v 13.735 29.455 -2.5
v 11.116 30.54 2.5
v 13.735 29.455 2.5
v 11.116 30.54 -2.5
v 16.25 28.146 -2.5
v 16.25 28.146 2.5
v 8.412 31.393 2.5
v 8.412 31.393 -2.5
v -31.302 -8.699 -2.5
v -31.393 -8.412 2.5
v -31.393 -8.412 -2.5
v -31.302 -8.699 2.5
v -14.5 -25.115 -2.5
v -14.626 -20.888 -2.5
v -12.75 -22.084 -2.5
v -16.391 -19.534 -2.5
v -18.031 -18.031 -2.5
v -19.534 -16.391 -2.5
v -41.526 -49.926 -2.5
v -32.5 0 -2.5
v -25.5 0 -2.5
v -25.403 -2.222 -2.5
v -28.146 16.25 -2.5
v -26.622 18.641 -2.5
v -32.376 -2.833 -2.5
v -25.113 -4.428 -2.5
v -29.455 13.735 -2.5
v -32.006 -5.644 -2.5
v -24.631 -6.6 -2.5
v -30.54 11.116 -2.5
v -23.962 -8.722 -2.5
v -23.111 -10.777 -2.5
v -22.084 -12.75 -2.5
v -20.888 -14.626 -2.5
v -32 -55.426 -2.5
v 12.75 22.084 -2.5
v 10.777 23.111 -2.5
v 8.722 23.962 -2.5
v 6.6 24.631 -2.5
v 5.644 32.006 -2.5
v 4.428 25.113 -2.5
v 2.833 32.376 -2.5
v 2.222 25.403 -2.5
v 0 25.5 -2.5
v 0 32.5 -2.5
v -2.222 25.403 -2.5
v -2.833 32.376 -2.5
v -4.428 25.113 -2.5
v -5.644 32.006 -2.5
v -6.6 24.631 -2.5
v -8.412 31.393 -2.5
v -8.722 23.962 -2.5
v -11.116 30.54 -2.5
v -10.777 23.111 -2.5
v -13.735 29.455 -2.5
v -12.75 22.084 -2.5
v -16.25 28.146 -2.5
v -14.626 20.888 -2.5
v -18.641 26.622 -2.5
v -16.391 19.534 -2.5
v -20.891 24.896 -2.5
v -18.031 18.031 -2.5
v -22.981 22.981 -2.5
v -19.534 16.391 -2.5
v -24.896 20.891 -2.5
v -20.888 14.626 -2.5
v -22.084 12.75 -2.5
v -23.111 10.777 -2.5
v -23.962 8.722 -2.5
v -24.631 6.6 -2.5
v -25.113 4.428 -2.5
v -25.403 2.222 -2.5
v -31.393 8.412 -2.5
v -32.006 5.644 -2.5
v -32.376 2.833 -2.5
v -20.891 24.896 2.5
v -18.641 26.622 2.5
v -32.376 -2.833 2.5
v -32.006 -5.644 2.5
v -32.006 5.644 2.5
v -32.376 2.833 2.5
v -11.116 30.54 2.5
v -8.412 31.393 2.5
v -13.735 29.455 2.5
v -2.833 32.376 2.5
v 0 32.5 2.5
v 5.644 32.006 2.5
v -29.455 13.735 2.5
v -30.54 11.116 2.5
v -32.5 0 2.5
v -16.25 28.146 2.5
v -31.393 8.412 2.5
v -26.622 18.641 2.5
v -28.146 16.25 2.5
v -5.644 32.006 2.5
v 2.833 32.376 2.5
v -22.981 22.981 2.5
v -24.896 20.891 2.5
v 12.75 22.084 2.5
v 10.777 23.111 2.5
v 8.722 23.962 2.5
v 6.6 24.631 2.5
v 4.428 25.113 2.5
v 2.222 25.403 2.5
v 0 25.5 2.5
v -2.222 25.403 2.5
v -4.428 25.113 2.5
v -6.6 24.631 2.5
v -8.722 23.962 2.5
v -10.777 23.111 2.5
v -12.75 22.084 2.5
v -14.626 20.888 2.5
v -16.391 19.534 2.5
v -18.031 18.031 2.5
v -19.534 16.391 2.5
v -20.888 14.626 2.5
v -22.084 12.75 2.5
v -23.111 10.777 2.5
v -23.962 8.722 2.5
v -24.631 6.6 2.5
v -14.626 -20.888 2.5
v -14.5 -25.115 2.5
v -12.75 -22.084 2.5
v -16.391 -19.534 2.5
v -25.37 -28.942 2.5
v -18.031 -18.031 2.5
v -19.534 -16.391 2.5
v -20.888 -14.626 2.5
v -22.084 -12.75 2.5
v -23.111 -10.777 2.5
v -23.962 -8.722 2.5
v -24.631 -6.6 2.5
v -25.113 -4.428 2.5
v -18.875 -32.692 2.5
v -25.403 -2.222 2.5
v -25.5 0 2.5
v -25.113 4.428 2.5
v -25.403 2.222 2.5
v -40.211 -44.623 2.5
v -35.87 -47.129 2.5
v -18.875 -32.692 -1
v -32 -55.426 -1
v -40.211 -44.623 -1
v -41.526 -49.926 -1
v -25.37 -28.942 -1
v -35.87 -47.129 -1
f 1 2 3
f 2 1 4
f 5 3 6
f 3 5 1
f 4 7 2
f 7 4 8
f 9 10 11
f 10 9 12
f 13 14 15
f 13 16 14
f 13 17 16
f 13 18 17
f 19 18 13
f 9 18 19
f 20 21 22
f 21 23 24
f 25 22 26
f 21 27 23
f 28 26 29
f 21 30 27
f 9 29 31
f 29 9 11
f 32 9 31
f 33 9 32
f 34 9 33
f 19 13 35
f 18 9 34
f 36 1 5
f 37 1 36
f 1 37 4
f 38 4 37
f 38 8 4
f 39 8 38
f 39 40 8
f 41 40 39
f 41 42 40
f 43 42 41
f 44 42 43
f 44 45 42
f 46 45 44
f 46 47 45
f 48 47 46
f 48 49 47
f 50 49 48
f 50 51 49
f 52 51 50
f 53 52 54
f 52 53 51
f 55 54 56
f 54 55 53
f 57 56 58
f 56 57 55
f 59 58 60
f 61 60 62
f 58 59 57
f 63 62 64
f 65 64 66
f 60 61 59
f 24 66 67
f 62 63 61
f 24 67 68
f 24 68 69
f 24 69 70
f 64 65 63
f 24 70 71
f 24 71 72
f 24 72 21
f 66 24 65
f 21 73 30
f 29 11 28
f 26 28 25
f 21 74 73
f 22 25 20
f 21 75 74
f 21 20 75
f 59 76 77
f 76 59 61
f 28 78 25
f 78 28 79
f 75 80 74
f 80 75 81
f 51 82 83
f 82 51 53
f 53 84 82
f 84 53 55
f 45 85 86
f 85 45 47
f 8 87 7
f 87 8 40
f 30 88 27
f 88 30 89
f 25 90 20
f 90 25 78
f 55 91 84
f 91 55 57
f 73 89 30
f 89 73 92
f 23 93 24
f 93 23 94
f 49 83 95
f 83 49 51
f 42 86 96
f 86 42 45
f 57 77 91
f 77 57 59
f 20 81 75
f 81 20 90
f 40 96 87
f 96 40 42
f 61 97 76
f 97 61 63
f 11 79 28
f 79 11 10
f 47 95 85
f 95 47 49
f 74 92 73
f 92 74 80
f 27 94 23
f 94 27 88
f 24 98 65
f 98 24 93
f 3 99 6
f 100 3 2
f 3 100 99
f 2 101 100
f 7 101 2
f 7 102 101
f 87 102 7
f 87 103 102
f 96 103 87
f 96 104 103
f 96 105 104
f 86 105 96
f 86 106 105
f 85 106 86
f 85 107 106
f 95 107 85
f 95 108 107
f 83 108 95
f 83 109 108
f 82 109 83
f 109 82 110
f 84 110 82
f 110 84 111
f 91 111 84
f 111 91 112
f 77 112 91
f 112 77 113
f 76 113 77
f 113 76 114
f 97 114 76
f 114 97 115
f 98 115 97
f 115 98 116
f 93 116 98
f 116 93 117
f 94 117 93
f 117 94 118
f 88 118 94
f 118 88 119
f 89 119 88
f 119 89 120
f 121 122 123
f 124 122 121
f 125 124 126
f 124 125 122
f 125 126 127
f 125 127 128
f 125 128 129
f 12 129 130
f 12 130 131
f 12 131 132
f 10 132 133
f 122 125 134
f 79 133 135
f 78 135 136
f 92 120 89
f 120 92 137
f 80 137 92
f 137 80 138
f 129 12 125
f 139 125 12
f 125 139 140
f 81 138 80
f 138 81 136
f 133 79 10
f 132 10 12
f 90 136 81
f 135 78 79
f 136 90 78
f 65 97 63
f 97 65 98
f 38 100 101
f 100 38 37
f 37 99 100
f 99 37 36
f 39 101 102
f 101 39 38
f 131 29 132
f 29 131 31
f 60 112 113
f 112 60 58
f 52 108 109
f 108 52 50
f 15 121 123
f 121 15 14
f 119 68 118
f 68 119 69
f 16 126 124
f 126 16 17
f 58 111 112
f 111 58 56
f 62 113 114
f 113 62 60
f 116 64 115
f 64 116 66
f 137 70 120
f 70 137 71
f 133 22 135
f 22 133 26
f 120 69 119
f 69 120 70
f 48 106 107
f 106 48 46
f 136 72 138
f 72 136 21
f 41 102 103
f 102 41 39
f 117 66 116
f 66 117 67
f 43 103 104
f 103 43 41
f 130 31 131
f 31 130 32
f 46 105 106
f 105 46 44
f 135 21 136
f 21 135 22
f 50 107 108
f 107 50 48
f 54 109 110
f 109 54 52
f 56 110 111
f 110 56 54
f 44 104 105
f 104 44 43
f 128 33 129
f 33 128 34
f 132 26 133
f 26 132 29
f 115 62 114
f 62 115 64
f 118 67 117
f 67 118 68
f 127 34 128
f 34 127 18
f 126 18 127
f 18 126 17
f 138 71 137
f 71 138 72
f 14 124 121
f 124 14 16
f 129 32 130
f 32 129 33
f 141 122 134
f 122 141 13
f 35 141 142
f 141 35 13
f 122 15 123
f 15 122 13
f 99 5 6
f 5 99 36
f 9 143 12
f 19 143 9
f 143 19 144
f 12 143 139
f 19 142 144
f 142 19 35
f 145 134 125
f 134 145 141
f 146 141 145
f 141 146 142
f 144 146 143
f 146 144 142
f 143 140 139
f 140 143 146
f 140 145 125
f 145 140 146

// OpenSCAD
$fs = 0.1;
$fa = 5;

lng_tige = 35;
lrg_tige = 11;
diam_ext = 65;
diam_int = 51;
e = 5;

dd = diam_ext - diam_int;

long_enc = 7.5;
larg_enc = 21;
prof_enc = 3.5;

x_enc = -(lng_tige/2 + dd/8 + diam_int/2 + dd/4);
y_enc = long_enc/2 - 1;
z_enc = e/2 - prof_enc/2 + 1;

module pince() {
	union() {
	    translate([-lng_tige - diam_ext/2 + dd/4, 0, -e/2])
		polyhedron([[0, 0, 0], [lng_tige, 0, 0],
		            [lng_tige + dd/2, 2.1*lrg_tige, 0], [0, lrg_tige, 0],
		            [0, 0, e], [lng_tige, 0, e],
		            [lng_tige + dd/2, 2.1*lrg_tige, e], [0, lrg_tige, e]],
		           [[0, 1, 2], [0, 2, 3],
		            [0, 4, 1], [4, 5, 1],
		            [1, 5, 2], [5, 6, 2],
		            [2, 6, 3], [6, 7, 3],
		            [3, 7, 0], [7, 4, 0],
		            [4, 6, 5], [4, 7, 6]]);
	    difference() {
		    color([75/255, 150/255, 0/255, 0.25]) cylinder(r=diam_ext/2, h=e, center=true);
		    #cylinder(r=diam_int/2, h=e+5, center=true);
		    translate([0, -diam_ext/4 - 5, 0]) cube([diam_ext + 5, diam_ext/2 + 10, e + 5], center=true); 
		}
	}
}

rotate([0, 0, 60]) // DECOMMENTER AVANT EXPORT MAKERBOT
//mirror([0, 1, 0])
difference() {
    pince();
	translate([x_enc, y_enc, z_enc]) cube([larg_enc, long_enc + 2, prof_enc + 2], center=true);
	#translate([x_enc - larg_enc/2 - 10, -5, e/2 - prof_enc]) cube([10, 20, prof_enc + 2]);
}
